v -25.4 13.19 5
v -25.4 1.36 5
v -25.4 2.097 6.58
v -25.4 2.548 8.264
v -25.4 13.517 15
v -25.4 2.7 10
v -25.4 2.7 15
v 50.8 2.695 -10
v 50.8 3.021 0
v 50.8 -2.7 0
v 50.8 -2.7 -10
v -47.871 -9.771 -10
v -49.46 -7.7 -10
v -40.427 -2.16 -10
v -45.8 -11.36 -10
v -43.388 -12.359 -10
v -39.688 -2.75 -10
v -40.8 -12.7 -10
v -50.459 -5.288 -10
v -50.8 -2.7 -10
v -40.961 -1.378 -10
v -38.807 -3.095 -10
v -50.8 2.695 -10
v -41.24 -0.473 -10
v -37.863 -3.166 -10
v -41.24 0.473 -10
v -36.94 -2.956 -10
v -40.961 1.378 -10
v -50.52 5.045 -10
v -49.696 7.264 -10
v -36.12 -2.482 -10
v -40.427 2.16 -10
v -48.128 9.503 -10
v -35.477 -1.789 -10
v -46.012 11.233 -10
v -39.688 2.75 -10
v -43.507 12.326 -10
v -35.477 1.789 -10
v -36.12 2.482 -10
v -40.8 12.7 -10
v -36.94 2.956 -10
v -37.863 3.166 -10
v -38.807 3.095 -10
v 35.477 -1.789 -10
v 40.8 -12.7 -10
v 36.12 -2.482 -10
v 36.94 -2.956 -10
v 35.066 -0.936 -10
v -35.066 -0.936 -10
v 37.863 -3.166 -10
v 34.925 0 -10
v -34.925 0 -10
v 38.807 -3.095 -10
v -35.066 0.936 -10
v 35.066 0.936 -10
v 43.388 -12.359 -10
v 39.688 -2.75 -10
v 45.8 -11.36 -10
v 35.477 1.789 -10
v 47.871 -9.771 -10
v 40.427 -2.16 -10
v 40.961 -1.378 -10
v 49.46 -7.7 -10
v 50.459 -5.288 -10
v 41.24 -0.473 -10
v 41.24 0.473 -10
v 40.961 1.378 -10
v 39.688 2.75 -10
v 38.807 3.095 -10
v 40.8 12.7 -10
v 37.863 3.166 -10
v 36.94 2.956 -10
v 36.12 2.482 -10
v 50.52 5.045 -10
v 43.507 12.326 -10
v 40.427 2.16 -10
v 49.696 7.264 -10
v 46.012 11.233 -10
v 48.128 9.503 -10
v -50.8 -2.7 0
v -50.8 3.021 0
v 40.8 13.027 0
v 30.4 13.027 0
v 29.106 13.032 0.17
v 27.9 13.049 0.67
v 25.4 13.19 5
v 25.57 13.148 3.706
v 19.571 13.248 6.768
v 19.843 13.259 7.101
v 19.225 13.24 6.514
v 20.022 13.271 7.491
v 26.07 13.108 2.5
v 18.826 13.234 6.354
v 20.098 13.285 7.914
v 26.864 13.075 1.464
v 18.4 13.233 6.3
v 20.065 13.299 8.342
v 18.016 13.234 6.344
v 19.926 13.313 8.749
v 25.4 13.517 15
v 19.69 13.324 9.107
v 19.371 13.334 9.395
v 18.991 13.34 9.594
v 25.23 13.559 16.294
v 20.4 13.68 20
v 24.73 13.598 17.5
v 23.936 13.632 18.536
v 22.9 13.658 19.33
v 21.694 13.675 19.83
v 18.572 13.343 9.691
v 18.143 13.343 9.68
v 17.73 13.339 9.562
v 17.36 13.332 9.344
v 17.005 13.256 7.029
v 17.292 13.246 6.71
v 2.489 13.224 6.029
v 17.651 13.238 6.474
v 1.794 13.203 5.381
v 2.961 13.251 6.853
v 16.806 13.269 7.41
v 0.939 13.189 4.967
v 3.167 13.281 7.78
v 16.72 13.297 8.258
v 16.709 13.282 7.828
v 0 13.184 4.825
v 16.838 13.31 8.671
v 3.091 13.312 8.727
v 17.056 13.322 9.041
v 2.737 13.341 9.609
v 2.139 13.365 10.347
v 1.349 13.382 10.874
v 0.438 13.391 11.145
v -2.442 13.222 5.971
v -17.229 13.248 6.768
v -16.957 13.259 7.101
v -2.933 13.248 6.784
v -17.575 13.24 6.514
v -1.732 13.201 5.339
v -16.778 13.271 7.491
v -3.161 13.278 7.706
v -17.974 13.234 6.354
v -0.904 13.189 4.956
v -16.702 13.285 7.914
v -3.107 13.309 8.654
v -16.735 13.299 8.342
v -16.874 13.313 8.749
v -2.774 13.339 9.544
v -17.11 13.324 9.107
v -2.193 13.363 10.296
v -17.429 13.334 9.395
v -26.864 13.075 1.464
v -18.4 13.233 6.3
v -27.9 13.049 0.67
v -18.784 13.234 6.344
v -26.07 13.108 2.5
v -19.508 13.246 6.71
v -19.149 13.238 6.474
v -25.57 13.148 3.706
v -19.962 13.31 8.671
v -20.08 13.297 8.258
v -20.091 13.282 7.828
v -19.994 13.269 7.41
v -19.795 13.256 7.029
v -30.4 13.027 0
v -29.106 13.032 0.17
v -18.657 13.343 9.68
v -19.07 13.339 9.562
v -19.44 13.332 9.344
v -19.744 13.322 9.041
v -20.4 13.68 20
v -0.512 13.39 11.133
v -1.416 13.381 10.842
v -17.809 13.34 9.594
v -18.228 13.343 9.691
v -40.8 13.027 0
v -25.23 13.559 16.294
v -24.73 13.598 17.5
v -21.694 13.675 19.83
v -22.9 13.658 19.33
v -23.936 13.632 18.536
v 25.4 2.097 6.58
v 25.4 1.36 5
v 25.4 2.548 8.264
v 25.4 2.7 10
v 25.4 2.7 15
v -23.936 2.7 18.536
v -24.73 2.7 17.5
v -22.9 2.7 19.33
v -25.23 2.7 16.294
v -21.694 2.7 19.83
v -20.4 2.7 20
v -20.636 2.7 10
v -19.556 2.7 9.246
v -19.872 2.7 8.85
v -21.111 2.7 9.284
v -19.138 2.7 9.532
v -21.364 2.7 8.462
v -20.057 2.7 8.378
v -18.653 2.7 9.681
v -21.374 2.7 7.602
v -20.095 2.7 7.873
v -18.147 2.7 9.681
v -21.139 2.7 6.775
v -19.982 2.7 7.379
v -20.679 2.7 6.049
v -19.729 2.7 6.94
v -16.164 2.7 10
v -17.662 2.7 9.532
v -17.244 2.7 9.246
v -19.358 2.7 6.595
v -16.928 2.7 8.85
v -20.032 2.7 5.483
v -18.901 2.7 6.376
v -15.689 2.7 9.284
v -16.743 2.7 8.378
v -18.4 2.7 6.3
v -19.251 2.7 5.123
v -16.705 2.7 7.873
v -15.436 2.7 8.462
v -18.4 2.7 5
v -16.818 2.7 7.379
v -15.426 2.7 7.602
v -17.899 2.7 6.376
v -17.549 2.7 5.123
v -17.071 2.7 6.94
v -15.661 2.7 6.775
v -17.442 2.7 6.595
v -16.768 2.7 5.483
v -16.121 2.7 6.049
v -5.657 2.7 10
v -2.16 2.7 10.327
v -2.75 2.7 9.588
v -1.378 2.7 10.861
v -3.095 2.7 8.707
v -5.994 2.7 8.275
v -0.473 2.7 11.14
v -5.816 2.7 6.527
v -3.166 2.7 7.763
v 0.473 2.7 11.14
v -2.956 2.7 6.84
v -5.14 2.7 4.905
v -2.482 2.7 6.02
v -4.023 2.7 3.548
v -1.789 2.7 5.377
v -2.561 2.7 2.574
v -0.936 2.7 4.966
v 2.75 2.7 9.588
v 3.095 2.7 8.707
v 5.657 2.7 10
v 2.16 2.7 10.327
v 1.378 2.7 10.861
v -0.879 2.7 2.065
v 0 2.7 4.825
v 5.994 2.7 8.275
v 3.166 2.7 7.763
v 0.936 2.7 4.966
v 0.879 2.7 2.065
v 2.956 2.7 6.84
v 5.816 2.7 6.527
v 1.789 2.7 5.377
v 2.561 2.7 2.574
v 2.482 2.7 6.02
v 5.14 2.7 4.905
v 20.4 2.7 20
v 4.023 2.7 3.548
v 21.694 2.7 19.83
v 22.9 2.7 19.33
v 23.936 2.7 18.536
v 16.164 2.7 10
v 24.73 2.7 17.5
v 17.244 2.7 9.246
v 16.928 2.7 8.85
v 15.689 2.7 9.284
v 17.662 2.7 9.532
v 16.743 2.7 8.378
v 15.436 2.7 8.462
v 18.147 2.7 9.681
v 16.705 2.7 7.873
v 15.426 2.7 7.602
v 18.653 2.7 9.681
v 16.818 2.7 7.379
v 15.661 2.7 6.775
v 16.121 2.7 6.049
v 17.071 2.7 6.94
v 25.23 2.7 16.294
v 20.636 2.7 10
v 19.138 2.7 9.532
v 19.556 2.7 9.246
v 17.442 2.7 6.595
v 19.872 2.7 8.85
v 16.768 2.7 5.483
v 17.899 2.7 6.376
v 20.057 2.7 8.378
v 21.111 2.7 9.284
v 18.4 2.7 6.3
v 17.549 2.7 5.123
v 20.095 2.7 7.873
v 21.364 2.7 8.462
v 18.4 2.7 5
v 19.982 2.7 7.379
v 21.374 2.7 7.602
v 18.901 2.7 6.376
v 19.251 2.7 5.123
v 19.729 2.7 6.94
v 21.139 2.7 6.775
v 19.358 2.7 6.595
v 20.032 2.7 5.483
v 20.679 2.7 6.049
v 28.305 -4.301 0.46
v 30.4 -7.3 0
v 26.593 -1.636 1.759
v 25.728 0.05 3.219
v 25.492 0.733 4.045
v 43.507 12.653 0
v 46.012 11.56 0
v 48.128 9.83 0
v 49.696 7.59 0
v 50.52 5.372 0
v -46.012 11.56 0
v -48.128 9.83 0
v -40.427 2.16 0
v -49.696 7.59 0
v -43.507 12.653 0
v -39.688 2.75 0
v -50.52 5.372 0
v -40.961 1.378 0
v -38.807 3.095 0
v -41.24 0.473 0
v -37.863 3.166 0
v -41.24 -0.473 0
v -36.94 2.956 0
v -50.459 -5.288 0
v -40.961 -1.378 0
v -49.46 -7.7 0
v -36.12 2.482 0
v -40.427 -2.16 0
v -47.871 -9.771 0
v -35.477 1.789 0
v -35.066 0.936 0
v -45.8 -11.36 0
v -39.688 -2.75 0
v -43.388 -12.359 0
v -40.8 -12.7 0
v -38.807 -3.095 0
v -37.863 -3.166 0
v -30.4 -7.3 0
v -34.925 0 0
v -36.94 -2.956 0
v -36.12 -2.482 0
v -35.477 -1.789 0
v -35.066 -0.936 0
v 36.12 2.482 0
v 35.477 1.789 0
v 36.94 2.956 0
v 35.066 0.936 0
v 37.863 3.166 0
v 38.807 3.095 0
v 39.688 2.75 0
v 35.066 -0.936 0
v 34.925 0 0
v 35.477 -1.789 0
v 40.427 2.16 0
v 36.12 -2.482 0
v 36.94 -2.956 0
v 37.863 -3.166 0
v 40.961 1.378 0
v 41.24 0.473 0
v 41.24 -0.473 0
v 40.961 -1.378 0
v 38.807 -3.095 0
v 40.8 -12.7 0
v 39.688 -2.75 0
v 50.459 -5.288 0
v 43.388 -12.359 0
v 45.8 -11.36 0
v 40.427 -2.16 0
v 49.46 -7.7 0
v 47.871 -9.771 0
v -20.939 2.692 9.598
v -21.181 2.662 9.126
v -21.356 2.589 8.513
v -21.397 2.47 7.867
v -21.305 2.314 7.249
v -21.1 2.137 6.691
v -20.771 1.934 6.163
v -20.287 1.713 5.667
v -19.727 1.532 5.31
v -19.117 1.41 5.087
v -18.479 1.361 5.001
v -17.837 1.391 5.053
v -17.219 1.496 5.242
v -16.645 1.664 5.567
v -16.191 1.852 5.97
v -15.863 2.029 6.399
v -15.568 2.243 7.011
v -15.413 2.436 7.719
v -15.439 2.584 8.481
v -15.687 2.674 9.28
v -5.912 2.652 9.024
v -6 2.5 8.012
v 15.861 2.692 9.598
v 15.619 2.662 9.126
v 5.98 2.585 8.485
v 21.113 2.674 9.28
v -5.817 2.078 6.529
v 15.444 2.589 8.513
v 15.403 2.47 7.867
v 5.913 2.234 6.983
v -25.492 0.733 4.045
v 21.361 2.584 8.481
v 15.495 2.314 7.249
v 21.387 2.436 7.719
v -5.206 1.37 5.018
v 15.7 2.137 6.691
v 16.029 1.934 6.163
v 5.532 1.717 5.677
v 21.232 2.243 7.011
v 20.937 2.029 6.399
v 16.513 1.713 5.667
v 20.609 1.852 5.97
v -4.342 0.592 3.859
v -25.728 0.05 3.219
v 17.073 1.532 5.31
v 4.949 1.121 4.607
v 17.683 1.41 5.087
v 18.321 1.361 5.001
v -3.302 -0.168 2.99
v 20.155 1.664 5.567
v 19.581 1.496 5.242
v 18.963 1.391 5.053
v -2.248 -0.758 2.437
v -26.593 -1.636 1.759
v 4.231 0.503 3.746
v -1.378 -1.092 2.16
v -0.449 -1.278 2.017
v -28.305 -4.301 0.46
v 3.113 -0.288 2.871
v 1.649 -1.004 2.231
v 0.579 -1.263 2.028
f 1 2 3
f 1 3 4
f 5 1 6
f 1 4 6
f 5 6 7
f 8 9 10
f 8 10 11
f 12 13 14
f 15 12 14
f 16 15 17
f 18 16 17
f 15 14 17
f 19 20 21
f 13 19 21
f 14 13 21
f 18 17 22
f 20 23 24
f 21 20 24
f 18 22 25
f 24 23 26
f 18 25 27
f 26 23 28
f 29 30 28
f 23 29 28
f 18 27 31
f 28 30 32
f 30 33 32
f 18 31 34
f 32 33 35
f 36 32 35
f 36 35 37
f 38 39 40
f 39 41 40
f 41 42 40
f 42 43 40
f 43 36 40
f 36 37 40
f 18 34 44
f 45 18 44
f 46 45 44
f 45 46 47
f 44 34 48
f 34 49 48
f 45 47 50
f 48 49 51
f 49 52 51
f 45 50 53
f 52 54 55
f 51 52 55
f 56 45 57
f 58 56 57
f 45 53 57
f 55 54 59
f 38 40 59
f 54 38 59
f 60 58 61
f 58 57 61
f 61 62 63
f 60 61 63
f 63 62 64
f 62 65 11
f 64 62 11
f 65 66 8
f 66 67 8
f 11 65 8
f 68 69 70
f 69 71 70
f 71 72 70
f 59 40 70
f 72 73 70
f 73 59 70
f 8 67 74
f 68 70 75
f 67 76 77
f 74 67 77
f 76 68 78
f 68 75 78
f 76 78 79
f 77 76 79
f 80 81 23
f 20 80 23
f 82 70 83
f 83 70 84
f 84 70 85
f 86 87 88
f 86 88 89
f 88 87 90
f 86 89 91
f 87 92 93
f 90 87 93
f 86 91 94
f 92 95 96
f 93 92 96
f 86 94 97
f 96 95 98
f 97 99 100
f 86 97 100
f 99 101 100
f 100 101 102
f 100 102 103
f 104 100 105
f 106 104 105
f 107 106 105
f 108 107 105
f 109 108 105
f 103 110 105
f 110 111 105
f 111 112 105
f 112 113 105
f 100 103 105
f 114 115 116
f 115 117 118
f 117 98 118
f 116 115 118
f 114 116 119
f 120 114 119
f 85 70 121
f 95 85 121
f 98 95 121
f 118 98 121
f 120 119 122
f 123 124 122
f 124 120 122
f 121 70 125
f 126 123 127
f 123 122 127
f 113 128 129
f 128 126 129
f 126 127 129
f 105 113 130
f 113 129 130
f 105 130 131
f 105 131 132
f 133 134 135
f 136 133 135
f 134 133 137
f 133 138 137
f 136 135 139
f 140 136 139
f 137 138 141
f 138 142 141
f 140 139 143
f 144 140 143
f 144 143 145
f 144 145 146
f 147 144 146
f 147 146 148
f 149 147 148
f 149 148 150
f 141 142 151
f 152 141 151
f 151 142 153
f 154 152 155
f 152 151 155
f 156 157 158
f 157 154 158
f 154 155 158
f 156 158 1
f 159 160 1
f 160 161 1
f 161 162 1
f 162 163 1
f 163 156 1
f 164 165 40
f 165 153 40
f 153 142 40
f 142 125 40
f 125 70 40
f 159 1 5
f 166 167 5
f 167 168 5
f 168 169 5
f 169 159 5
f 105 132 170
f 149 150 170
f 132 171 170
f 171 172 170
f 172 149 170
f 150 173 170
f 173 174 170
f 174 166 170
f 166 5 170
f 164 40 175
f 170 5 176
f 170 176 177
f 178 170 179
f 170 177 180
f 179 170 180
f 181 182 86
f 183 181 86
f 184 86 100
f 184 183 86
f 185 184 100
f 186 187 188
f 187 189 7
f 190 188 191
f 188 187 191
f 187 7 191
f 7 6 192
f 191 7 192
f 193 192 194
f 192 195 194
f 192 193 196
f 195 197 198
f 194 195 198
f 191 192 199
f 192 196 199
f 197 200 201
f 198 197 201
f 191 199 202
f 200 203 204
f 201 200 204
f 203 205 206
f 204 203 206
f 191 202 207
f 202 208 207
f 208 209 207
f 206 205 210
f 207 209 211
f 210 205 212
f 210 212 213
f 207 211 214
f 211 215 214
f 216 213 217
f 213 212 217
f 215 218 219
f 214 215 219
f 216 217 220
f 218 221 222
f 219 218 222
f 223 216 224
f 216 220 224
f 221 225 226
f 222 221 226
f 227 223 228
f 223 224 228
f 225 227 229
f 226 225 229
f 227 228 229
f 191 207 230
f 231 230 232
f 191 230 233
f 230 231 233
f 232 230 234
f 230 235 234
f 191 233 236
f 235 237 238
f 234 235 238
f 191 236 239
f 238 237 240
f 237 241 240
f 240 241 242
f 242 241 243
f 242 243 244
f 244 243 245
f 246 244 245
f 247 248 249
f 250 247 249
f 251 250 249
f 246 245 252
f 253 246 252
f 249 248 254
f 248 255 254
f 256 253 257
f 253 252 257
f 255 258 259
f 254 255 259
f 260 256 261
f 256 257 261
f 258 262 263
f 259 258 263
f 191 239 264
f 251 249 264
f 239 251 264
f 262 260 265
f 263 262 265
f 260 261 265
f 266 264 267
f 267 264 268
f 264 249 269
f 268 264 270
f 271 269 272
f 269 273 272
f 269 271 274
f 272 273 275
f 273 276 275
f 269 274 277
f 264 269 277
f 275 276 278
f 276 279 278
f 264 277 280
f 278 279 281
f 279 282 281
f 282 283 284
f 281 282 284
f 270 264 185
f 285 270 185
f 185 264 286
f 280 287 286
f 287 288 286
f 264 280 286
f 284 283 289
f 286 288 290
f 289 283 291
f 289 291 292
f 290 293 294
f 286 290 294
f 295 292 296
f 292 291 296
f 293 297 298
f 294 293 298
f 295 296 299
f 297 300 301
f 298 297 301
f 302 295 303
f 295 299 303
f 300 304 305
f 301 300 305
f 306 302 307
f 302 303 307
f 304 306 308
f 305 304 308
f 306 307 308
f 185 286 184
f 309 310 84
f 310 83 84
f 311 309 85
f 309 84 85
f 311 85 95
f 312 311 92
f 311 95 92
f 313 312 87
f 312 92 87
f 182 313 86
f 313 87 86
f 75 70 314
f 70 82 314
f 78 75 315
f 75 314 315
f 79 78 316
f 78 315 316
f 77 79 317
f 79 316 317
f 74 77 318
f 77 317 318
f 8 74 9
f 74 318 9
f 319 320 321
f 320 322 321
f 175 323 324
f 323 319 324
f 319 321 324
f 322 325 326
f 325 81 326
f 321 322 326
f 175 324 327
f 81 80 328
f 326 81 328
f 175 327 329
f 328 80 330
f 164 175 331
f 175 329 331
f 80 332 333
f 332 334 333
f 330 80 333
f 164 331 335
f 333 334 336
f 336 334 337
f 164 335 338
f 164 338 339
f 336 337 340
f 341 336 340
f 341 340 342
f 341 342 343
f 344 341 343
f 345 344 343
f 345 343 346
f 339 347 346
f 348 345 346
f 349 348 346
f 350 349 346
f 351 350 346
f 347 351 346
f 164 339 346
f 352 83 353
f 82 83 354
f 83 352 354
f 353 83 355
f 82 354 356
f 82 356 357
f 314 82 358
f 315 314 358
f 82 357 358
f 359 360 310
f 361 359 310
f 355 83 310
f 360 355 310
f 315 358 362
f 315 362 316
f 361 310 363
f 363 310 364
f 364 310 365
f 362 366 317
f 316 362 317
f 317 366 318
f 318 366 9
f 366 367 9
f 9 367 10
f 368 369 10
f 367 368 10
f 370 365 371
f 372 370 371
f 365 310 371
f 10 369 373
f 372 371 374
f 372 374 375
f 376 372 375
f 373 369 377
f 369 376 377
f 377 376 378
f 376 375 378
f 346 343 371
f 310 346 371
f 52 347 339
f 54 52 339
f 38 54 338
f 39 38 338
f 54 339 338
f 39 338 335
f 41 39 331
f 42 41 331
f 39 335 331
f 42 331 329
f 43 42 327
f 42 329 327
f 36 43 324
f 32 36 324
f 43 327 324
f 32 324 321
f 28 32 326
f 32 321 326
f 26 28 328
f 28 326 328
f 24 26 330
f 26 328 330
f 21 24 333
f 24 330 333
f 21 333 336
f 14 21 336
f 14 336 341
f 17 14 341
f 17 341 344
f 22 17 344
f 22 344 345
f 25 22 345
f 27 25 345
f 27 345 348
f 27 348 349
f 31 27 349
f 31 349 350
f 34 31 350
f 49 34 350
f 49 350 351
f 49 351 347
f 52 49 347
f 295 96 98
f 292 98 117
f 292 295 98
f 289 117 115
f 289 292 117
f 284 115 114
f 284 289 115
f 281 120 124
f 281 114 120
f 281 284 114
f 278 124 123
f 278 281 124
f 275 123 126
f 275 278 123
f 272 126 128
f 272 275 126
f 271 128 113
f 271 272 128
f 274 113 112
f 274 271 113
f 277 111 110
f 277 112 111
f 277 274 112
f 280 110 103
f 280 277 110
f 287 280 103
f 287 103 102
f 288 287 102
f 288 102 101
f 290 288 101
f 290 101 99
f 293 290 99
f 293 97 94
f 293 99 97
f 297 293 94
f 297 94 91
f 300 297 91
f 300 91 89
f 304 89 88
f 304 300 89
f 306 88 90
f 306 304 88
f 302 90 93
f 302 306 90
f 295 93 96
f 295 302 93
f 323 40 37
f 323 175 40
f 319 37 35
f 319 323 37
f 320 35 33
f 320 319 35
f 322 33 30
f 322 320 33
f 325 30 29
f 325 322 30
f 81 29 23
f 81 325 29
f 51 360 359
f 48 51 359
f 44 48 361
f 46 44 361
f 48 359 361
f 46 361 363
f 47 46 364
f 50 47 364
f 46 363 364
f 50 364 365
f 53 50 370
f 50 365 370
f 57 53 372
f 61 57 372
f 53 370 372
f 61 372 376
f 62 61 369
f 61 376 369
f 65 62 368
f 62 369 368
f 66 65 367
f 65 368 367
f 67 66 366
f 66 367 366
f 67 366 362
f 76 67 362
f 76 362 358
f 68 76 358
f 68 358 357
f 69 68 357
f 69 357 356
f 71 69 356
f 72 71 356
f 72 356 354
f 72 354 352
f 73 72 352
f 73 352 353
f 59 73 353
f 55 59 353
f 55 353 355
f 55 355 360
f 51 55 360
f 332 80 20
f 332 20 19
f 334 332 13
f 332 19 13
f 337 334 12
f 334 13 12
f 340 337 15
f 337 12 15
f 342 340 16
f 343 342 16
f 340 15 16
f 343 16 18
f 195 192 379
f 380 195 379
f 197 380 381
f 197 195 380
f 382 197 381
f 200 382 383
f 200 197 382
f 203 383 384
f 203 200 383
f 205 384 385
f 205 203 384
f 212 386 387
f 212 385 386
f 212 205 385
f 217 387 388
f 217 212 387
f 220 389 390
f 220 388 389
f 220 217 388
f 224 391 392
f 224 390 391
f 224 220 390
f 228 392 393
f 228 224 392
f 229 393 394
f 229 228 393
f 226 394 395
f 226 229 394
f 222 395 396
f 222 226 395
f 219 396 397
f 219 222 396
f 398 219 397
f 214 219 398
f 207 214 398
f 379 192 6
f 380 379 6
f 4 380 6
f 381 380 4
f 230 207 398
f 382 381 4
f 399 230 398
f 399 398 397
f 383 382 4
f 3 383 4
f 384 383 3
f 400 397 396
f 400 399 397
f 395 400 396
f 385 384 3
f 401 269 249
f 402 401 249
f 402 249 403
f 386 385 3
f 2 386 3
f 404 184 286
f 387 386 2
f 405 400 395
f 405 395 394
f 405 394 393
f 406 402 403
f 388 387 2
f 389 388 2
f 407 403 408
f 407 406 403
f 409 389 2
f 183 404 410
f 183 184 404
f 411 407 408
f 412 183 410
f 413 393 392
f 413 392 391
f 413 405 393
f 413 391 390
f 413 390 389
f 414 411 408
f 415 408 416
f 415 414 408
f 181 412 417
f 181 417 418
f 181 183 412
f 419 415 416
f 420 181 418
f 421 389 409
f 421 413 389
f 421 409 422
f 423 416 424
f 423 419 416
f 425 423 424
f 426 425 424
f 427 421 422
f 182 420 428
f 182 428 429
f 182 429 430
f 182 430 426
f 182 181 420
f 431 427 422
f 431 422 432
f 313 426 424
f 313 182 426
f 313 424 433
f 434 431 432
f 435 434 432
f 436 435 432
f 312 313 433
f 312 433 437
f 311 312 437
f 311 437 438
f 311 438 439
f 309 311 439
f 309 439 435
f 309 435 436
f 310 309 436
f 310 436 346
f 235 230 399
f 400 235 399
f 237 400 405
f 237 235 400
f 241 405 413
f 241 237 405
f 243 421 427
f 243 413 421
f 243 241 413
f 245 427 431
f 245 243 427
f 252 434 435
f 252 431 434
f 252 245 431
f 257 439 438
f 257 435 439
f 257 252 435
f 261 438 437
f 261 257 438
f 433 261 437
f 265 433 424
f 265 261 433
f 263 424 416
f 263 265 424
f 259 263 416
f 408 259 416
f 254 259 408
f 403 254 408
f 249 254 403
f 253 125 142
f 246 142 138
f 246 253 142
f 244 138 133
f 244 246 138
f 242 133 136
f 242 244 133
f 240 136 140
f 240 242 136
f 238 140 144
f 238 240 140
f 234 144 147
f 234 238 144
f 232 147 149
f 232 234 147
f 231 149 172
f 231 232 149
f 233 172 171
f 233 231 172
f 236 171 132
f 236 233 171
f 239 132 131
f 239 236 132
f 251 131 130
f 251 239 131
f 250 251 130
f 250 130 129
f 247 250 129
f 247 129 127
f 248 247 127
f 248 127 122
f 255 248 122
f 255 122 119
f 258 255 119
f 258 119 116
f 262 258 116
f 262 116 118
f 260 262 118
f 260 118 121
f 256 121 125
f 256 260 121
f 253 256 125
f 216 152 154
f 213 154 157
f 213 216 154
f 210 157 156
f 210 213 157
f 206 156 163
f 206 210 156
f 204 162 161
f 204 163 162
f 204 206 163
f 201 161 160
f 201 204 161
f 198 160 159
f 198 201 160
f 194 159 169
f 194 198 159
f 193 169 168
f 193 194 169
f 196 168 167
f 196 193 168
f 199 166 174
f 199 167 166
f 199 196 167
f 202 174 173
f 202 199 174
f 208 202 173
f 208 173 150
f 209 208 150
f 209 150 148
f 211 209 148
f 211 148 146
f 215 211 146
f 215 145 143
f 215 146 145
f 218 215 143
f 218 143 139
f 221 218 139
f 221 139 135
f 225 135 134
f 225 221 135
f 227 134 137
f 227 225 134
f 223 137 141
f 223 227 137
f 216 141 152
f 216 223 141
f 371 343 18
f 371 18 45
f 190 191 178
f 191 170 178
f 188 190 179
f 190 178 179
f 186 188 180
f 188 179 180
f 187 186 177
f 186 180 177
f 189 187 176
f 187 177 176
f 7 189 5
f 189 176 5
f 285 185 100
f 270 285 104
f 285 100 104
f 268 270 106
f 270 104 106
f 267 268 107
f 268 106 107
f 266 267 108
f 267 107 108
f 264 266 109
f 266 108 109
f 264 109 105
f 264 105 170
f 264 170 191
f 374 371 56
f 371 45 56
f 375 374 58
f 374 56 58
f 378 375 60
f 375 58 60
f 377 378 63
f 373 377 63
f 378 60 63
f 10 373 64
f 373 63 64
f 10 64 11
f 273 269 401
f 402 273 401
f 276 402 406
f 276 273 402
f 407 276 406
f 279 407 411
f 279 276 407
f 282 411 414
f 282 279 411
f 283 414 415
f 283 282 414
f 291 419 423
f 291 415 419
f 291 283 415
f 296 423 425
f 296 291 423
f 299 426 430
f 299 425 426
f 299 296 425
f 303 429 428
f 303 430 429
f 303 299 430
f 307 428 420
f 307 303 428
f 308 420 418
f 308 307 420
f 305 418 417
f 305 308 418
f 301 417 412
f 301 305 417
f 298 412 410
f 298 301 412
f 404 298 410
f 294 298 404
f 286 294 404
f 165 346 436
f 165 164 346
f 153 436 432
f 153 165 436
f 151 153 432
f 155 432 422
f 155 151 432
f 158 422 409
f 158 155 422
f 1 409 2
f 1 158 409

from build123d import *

# Parameters (mm, degrees)
SKETCH1_W                = 101.6
SKETCH1_H                = 25.4
BOSS_EXTRUDE1_DEPTH      = 10
SKETCH4_W                = 50.8
SKETCH4_H                = 20
BOSS_EXTRUDE2_DEPTH      = 10
BOSS_EXTRUDE4_DEPTH      = 50.8
BOSS_EXTRUDE4_DEPTH_BACK = 50.8
SKETCH9_W                = 25.4
SKETCH9_H                = 20
CUT_EXTRUDE4_DEPTH       = 61.214616166
FILLET1_R                = 10
CUT_EXTRUDE1_REACH       = 58.726
SKETCH5_R                = 3.175
SKETCH5_R_2              = 1.7
CUT_EXTRUDE2_REACH       = 58.283
SKETCH6_R                = 3.175
FILLET2_R                = 10
CUT_EXTRUDE3_REACH       = 58.726
SKETCH7_R                = 6
SKETCH7_R_2              = 3
FILLET3_R                = 5
FILLET4_R                = 5


with BuildPart() as part:
    # Sketch1 → Boss-Extrude1 (new body)
    with BuildSketch(Plane.XY):
        Rectangle(SKETCH1_W, SKETCH1_H)
    extrude(amount=-BOSS_EXTRUDE1_DEPTH)

    # Sketch4 → Boss-Extrude2 (add)
    with BuildSketch(Plane(origin=(0, 12.7, 0), x_dir=(1, 0, 0), z_dir=(0, 1, 0))):
        with Locations((0, -10)):
            Rectangle(SKETCH4_W, SKETCH4_H)
    extrude(amount=-BOSS_EXTRUDE2_DEPTH)

    # Sketch8 → Boss-Extrude4 (add, two sides: drawn at the far end of the back side and taken through both)
    with BuildSketch(Plane(origin=(0, 0, 0), x_dir=(0, 0, -1), z_dir=(1, 0, 0)).offset(-BOSS_EXTRUDE4_DEPTH_BACK)):
        Polygon((10, 12.7), (-20, 13.680158925), (-20, 12.7), align=None)
    extrude(amount=BOSS_EXTRUDE4_DEPTH + BOSS_EXTRUDE4_DEPTH_BACK)

    # Sketch9 → Cut-Extrude4 (cut, through all)
    with BuildSketch(Plane.XZ.offset(-12.7)):
        with Locations((-38.1, 10)):
            Rectangle(SKETCH9_W, SKETCH9_H)
        with Locations((38.1, 10)):
            Rectangle(SKETCH9_W, SKETCH9_H)
    extrude(amount=-CUT_EXTRUDE4_DEPTH, mode=Mode.SUBTRACT)

    # Fillet1
    fillet1_edges = [part.edges().sort_by_distance(p)[0] for p in [
        (0, 2.7, 0),
    ]]
    fillet(fillet1_edges, radius=FILLET1_R)

    # Cut-Extrude1: up to this plane
    cut_extrude1_end = Plane(origin=(50.8, 12.7, -10), z_dir=(0, -0.9994666982985511, 0.03265454014671021))
    # Sketch5 → Cut-Extrude1 (cut, up to the surface)
    with BuildSketch(Plane(origin=(0, 2.7, 0), x_dir=(1, 0, 0), z_dir=(0, 1, 0)), mode=Mode.PRIVATE) as cut_extrude1_sk1:
        with Locations(Location((0, -8, 0), (0, 0, 90))):
            Circle(SKETCH5_R)
    cut_extrude1_tool1 = split(extrude(cut_extrude1_sk1.sketch, amount=CUT_EXTRUDE1_REACH, mode=Mode.PRIVATE), bisect_by=cut_extrude1_end, keep=Keep.BOTH, mode=Mode.PRIVATE)
    add(cut_extrude1_tool1.solids().sort_by_distance((0, 2.7, 8))[0], mode=Mode.SUBTRACT)
    # Sketch5 → Cut-Extrude1 (cut, up to the surface)
    with BuildSketch(Plane(origin=(0, 2.7, 0), x_dir=(1, 0, 0), z_dir=(0, 1, 0)), mode=Mode.PRIVATE) as cut_extrude1_sk2:
        with Locations(Location((-18.4, -8, 0), (0, 0, 90))):
            Circle(SKETCH5_R_2)
    cut_extrude1_tool2 = split(extrude(cut_extrude1_sk2.sketch, amount=CUT_EXTRUDE1_REACH, mode=Mode.PRIVATE), bisect_by=cut_extrude1_end, keep=Keep.BOTH, mode=Mode.PRIVATE)
    add(cut_extrude1_tool2.solids().sort_by_distance((-18.4, 2.7, 8))[0], mode=Mode.SUBTRACT)
    # Sketch5 → Cut-Extrude1 (cut, up to the surface)
    with BuildSketch(Plane(origin=(0, 2.7, 0), x_dir=(1, 0, 0), z_dir=(0, 1, 0)), mode=Mode.PRIVATE) as cut_extrude1_sk3:
        with Locations(Location((18.4, -8, 0), (0, 0, 90))):
            Circle(SKETCH5_R_2)
    cut_extrude1_tool3 = split(extrude(cut_extrude1_sk3.sketch, amount=CUT_EXTRUDE1_REACH, mode=Mode.PRIVATE), bisect_by=cut_extrude1_end, keep=Keep.BOTH, mode=Mode.PRIVATE)
    add(cut_extrude1_tool3.solids().sort_by_distance((18.4, 2.7, 8))[0], mode=Mode.SUBTRACT)

    # Sketch6 → Cut-Extrude2 (cut, up to next)
    with BuildSketch(Plane.XY, mode=Mode.PRIVATE) as cut_extrude2_sk1:
        with Locations((-38.1, 0)):
            Circle(SKETCH6_R)
    cut_extrude2_tool1 = extrude(cut_extrude2_sk1.sketch, amount=-CUT_EXTRUDE2_REACH, mode=Mode.PRIVATE) & part.part
    # Sketch6 → Cut-Extrude2 (cut, up to next)
    with BuildSketch(Plane.XY, mode=Mode.PRIVATE) as cut_extrude2_sk2:
        with Locations(Location((38.1, 0, 0), (0, 0, 180))):
            Circle(SKETCH6_R)
    cut_extrude2_tool2 = extrude(cut_extrude2_sk2.sketch, amount=-CUT_EXTRUDE2_REACH, mode=Mode.PRIVATE) & part.part
    add(cut_extrude2_tool1.solids().sort_by_distance((-38.1, 0, 0))[0], mode=Mode.SUBTRACT)
    add(cut_extrude2_tool2.solids().sort_by_distance((38.1, 0, 0))[0], mode=Mode.SUBTRACT)

    # Fillet2
    fillet2_edges = [part.edges().sort_by_distance(p)[0] for p in [
        (-50.8, 12.863359821, -5),
        (50.8, 12.863359821, -5),
        (50.8, -12.7, -5),
        (-50.8, -12.7, -5),
    ]]
    fillet(fillet2_edges, radius=FILLET2_R)

    # Sketch7 → Cut-Extrude3 (cut, up to next)
    with BuildSketch(Plane.XZ.offset(-2.7), mode=Mode.PRIVATE) as cut_extrude3_sk1:
        with Locations((0, 8)):
            Circle(SKETCH7_R)
    cut_extrude3_tool1 = extrude(cut_extrude3_sk1.sketch, amount=CUT_EXTRUDE3_REACH, mode=Mode.PRIVATE) & part.part
    # Sketch7 → Cut-Extrude3 (cut, up to next)
    with BuildSketch(Plane.XZ.offset(-2.7), mode=Mode.PRIVATE) as cut_extrude3_sk2:
        with Locations((-18.4, 8)):
            Circle(SKETCH7_R_2)
    cut_extrude3_tool2 = extrude(cut_extrude3_sk2.sketch, amount=CUT_EXTRUDE3_REACH, mode=Mode.PRIVATE) & part.part
    # Sketch7 → Cut-Extrude3 (cut, up to next)
    with BuildSketch(Plane.XZ.offset(-2.7), mode=Mode.PRIVATE) as cut_extrude3_sk3:
        with Locations((18.4, 8)):
            Circle(SKETCH7_R_2)
    cut_extrude3_tool3 = extrude(cut_extrude3_sk3.sketch, amount=CUT_EXTRUDE3_REACH, mode=Mode.PRIVATE) & part.part
    add(cut_extrude3_tool1.solids().sort_by_distance((0, 2.7, 8))[0], mode=Mode.SUBTRACT)
    add(cut_extrude3_tool2.solids().sort_by_distance((-18.4, 2.7, 8))[0], mode=Mode.SUBTRACT)
    add(cut_extrude3_tool3.solids().sort_by_distance((18.4, 2.7, 8))[0], mode=Mode.SUBTRACT)

    # Fillet3
    fillet3_edges = [part.edges().sort_by_distance(p)[0] for p in [
        (-25.4, 2.863359821, 0),
        (25.4, 2.863359821, 0),
    ]]
    fillet(fillet3_edges, radius=FILLET3_R)

    # Fillet4
    fillet4_edges = [part.edges().sort_by_distance(p)[0] for p in [
        (-25.4, 8.190079462, 20),
        (25.4, 8.190079462, 20),
    ]]
    fillet(fillet4_edges, radius=FILLET4_R)


solid = part.part
